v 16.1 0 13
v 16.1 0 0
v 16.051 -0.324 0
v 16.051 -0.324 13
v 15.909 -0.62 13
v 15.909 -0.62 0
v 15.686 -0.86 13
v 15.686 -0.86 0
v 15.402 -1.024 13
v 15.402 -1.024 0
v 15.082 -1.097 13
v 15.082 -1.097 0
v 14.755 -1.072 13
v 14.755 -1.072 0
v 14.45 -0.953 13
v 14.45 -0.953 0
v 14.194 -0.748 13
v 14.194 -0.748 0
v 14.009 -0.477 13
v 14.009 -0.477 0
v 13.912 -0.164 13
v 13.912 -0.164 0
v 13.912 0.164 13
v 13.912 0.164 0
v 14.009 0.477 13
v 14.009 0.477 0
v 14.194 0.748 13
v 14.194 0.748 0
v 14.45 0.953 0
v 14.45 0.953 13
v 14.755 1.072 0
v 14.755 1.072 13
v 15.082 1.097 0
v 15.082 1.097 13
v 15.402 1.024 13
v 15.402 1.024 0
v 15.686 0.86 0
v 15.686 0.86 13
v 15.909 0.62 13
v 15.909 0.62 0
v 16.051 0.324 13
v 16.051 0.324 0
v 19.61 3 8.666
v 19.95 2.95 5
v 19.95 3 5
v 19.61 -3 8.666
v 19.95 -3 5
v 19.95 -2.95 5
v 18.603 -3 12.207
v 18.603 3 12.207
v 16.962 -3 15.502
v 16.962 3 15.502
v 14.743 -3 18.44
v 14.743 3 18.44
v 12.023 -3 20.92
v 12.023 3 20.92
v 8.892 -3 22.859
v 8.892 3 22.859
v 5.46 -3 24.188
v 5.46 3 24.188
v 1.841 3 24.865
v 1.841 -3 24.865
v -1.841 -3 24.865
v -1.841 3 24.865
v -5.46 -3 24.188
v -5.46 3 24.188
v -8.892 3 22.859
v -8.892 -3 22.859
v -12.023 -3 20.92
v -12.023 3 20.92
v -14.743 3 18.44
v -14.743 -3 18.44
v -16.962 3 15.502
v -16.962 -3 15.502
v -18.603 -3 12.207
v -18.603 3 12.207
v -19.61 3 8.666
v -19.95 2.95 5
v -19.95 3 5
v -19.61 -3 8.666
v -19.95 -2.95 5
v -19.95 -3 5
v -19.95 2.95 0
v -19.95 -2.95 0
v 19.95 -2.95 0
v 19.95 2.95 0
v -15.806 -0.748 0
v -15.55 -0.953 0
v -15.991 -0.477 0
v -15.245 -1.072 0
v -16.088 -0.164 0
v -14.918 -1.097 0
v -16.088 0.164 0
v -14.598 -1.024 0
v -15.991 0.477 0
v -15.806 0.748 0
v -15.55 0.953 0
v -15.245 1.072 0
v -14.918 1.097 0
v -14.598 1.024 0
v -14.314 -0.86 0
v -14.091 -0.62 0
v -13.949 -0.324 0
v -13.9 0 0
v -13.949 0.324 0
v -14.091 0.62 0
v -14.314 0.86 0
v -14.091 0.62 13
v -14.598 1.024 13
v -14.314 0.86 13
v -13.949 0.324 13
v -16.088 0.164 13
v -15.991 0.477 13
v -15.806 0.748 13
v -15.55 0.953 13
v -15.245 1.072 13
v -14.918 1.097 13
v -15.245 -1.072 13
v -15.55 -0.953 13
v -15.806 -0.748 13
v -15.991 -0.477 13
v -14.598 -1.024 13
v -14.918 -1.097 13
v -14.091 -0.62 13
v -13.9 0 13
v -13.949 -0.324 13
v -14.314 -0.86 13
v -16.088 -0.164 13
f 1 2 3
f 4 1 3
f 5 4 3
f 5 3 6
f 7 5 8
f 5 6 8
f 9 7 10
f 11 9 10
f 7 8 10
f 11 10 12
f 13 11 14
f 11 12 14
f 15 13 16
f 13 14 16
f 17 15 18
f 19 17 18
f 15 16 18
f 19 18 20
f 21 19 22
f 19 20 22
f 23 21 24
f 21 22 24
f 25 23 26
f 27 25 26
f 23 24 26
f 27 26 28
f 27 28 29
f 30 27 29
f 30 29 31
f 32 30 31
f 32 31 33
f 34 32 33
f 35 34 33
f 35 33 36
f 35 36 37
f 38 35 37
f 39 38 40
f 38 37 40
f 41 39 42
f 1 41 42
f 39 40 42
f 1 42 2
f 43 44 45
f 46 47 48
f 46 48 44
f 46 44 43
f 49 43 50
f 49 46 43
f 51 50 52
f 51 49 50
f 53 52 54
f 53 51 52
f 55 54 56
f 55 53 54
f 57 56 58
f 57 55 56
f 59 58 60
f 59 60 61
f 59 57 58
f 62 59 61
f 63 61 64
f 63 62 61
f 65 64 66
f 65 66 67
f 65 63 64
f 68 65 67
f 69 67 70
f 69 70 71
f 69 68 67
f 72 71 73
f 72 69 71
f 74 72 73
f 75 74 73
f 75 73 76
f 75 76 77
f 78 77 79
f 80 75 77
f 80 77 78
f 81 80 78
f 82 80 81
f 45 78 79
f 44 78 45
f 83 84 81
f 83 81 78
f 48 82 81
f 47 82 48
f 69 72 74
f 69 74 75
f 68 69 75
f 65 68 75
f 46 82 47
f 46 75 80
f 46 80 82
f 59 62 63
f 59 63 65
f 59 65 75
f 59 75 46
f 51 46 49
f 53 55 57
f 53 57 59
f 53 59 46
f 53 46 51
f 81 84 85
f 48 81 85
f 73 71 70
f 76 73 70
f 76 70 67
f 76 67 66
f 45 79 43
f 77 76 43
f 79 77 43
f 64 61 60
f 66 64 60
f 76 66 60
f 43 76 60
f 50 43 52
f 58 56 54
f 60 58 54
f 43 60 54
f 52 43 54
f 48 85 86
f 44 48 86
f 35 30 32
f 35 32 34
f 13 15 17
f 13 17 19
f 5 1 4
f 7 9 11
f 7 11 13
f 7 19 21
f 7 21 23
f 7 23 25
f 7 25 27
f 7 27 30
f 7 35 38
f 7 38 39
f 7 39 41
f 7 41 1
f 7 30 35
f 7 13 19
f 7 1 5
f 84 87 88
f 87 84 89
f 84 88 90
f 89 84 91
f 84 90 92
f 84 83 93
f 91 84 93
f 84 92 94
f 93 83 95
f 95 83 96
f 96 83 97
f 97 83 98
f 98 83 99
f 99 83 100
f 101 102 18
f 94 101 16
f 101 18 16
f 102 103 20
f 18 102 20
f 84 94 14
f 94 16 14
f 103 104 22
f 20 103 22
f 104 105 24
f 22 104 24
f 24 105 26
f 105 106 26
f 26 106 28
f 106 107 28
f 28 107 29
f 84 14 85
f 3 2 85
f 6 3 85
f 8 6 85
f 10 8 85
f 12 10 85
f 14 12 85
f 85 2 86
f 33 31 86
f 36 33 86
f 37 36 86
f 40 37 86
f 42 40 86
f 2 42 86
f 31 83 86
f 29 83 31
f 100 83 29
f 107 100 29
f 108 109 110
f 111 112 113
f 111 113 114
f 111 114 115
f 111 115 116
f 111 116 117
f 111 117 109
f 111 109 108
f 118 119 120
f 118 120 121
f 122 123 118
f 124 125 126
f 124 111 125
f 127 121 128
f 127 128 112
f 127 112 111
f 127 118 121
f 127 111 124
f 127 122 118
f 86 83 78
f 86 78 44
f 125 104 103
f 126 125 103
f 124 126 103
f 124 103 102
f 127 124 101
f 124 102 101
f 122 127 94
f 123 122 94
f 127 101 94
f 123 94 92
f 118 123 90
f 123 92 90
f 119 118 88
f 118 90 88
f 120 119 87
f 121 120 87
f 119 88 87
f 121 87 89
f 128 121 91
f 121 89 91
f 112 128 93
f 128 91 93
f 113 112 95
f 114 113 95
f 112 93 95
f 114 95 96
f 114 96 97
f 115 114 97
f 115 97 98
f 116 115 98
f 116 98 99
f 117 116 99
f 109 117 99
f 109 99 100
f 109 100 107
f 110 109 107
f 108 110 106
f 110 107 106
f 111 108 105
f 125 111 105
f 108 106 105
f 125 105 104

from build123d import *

# Parameters (mm, degrees)
F0_W     = 39.9
F0_H     = 5.9
F1_DEPTH = 5
F3_DEPTH = 3
F4_R     = 1.1
F5_DEPTH = 13


with BuildPart() as f1:
    # F0 (on Top) → F1 (new body)
    with BuildSketch(Plane.XY):
        Rectangle(F0_W, F0_H)
    extrude(amount=F1_DEPTH)

    # F2 (on Front) → F3 (join, symmetric)
    with BuildSketch(Plane.XZ):
        with BuildLine():
            Line((-19.95, 5), (19.95, 5))
            ThreePointArc((19.95, 5), (0, 24.95), (-19.95, 5))
        make_face()
    extrude(amount=F3_DEPTH, both=True)

    # F4 (on face) → F5 (cut)
    with BuildSketch(Plane(origin=(0, 0, 0), x_dir=(1, 0, 0), z_dir=(0, 0, -1))):
        with Locations((15, 0)):
            Circle(F4_R)
        with Locations((-15, 0)):
            Circle(F4_R)
    extrude(amount=-F5_DEPTH, mode=Mode.SUBTRACT)


solid = f1.part
